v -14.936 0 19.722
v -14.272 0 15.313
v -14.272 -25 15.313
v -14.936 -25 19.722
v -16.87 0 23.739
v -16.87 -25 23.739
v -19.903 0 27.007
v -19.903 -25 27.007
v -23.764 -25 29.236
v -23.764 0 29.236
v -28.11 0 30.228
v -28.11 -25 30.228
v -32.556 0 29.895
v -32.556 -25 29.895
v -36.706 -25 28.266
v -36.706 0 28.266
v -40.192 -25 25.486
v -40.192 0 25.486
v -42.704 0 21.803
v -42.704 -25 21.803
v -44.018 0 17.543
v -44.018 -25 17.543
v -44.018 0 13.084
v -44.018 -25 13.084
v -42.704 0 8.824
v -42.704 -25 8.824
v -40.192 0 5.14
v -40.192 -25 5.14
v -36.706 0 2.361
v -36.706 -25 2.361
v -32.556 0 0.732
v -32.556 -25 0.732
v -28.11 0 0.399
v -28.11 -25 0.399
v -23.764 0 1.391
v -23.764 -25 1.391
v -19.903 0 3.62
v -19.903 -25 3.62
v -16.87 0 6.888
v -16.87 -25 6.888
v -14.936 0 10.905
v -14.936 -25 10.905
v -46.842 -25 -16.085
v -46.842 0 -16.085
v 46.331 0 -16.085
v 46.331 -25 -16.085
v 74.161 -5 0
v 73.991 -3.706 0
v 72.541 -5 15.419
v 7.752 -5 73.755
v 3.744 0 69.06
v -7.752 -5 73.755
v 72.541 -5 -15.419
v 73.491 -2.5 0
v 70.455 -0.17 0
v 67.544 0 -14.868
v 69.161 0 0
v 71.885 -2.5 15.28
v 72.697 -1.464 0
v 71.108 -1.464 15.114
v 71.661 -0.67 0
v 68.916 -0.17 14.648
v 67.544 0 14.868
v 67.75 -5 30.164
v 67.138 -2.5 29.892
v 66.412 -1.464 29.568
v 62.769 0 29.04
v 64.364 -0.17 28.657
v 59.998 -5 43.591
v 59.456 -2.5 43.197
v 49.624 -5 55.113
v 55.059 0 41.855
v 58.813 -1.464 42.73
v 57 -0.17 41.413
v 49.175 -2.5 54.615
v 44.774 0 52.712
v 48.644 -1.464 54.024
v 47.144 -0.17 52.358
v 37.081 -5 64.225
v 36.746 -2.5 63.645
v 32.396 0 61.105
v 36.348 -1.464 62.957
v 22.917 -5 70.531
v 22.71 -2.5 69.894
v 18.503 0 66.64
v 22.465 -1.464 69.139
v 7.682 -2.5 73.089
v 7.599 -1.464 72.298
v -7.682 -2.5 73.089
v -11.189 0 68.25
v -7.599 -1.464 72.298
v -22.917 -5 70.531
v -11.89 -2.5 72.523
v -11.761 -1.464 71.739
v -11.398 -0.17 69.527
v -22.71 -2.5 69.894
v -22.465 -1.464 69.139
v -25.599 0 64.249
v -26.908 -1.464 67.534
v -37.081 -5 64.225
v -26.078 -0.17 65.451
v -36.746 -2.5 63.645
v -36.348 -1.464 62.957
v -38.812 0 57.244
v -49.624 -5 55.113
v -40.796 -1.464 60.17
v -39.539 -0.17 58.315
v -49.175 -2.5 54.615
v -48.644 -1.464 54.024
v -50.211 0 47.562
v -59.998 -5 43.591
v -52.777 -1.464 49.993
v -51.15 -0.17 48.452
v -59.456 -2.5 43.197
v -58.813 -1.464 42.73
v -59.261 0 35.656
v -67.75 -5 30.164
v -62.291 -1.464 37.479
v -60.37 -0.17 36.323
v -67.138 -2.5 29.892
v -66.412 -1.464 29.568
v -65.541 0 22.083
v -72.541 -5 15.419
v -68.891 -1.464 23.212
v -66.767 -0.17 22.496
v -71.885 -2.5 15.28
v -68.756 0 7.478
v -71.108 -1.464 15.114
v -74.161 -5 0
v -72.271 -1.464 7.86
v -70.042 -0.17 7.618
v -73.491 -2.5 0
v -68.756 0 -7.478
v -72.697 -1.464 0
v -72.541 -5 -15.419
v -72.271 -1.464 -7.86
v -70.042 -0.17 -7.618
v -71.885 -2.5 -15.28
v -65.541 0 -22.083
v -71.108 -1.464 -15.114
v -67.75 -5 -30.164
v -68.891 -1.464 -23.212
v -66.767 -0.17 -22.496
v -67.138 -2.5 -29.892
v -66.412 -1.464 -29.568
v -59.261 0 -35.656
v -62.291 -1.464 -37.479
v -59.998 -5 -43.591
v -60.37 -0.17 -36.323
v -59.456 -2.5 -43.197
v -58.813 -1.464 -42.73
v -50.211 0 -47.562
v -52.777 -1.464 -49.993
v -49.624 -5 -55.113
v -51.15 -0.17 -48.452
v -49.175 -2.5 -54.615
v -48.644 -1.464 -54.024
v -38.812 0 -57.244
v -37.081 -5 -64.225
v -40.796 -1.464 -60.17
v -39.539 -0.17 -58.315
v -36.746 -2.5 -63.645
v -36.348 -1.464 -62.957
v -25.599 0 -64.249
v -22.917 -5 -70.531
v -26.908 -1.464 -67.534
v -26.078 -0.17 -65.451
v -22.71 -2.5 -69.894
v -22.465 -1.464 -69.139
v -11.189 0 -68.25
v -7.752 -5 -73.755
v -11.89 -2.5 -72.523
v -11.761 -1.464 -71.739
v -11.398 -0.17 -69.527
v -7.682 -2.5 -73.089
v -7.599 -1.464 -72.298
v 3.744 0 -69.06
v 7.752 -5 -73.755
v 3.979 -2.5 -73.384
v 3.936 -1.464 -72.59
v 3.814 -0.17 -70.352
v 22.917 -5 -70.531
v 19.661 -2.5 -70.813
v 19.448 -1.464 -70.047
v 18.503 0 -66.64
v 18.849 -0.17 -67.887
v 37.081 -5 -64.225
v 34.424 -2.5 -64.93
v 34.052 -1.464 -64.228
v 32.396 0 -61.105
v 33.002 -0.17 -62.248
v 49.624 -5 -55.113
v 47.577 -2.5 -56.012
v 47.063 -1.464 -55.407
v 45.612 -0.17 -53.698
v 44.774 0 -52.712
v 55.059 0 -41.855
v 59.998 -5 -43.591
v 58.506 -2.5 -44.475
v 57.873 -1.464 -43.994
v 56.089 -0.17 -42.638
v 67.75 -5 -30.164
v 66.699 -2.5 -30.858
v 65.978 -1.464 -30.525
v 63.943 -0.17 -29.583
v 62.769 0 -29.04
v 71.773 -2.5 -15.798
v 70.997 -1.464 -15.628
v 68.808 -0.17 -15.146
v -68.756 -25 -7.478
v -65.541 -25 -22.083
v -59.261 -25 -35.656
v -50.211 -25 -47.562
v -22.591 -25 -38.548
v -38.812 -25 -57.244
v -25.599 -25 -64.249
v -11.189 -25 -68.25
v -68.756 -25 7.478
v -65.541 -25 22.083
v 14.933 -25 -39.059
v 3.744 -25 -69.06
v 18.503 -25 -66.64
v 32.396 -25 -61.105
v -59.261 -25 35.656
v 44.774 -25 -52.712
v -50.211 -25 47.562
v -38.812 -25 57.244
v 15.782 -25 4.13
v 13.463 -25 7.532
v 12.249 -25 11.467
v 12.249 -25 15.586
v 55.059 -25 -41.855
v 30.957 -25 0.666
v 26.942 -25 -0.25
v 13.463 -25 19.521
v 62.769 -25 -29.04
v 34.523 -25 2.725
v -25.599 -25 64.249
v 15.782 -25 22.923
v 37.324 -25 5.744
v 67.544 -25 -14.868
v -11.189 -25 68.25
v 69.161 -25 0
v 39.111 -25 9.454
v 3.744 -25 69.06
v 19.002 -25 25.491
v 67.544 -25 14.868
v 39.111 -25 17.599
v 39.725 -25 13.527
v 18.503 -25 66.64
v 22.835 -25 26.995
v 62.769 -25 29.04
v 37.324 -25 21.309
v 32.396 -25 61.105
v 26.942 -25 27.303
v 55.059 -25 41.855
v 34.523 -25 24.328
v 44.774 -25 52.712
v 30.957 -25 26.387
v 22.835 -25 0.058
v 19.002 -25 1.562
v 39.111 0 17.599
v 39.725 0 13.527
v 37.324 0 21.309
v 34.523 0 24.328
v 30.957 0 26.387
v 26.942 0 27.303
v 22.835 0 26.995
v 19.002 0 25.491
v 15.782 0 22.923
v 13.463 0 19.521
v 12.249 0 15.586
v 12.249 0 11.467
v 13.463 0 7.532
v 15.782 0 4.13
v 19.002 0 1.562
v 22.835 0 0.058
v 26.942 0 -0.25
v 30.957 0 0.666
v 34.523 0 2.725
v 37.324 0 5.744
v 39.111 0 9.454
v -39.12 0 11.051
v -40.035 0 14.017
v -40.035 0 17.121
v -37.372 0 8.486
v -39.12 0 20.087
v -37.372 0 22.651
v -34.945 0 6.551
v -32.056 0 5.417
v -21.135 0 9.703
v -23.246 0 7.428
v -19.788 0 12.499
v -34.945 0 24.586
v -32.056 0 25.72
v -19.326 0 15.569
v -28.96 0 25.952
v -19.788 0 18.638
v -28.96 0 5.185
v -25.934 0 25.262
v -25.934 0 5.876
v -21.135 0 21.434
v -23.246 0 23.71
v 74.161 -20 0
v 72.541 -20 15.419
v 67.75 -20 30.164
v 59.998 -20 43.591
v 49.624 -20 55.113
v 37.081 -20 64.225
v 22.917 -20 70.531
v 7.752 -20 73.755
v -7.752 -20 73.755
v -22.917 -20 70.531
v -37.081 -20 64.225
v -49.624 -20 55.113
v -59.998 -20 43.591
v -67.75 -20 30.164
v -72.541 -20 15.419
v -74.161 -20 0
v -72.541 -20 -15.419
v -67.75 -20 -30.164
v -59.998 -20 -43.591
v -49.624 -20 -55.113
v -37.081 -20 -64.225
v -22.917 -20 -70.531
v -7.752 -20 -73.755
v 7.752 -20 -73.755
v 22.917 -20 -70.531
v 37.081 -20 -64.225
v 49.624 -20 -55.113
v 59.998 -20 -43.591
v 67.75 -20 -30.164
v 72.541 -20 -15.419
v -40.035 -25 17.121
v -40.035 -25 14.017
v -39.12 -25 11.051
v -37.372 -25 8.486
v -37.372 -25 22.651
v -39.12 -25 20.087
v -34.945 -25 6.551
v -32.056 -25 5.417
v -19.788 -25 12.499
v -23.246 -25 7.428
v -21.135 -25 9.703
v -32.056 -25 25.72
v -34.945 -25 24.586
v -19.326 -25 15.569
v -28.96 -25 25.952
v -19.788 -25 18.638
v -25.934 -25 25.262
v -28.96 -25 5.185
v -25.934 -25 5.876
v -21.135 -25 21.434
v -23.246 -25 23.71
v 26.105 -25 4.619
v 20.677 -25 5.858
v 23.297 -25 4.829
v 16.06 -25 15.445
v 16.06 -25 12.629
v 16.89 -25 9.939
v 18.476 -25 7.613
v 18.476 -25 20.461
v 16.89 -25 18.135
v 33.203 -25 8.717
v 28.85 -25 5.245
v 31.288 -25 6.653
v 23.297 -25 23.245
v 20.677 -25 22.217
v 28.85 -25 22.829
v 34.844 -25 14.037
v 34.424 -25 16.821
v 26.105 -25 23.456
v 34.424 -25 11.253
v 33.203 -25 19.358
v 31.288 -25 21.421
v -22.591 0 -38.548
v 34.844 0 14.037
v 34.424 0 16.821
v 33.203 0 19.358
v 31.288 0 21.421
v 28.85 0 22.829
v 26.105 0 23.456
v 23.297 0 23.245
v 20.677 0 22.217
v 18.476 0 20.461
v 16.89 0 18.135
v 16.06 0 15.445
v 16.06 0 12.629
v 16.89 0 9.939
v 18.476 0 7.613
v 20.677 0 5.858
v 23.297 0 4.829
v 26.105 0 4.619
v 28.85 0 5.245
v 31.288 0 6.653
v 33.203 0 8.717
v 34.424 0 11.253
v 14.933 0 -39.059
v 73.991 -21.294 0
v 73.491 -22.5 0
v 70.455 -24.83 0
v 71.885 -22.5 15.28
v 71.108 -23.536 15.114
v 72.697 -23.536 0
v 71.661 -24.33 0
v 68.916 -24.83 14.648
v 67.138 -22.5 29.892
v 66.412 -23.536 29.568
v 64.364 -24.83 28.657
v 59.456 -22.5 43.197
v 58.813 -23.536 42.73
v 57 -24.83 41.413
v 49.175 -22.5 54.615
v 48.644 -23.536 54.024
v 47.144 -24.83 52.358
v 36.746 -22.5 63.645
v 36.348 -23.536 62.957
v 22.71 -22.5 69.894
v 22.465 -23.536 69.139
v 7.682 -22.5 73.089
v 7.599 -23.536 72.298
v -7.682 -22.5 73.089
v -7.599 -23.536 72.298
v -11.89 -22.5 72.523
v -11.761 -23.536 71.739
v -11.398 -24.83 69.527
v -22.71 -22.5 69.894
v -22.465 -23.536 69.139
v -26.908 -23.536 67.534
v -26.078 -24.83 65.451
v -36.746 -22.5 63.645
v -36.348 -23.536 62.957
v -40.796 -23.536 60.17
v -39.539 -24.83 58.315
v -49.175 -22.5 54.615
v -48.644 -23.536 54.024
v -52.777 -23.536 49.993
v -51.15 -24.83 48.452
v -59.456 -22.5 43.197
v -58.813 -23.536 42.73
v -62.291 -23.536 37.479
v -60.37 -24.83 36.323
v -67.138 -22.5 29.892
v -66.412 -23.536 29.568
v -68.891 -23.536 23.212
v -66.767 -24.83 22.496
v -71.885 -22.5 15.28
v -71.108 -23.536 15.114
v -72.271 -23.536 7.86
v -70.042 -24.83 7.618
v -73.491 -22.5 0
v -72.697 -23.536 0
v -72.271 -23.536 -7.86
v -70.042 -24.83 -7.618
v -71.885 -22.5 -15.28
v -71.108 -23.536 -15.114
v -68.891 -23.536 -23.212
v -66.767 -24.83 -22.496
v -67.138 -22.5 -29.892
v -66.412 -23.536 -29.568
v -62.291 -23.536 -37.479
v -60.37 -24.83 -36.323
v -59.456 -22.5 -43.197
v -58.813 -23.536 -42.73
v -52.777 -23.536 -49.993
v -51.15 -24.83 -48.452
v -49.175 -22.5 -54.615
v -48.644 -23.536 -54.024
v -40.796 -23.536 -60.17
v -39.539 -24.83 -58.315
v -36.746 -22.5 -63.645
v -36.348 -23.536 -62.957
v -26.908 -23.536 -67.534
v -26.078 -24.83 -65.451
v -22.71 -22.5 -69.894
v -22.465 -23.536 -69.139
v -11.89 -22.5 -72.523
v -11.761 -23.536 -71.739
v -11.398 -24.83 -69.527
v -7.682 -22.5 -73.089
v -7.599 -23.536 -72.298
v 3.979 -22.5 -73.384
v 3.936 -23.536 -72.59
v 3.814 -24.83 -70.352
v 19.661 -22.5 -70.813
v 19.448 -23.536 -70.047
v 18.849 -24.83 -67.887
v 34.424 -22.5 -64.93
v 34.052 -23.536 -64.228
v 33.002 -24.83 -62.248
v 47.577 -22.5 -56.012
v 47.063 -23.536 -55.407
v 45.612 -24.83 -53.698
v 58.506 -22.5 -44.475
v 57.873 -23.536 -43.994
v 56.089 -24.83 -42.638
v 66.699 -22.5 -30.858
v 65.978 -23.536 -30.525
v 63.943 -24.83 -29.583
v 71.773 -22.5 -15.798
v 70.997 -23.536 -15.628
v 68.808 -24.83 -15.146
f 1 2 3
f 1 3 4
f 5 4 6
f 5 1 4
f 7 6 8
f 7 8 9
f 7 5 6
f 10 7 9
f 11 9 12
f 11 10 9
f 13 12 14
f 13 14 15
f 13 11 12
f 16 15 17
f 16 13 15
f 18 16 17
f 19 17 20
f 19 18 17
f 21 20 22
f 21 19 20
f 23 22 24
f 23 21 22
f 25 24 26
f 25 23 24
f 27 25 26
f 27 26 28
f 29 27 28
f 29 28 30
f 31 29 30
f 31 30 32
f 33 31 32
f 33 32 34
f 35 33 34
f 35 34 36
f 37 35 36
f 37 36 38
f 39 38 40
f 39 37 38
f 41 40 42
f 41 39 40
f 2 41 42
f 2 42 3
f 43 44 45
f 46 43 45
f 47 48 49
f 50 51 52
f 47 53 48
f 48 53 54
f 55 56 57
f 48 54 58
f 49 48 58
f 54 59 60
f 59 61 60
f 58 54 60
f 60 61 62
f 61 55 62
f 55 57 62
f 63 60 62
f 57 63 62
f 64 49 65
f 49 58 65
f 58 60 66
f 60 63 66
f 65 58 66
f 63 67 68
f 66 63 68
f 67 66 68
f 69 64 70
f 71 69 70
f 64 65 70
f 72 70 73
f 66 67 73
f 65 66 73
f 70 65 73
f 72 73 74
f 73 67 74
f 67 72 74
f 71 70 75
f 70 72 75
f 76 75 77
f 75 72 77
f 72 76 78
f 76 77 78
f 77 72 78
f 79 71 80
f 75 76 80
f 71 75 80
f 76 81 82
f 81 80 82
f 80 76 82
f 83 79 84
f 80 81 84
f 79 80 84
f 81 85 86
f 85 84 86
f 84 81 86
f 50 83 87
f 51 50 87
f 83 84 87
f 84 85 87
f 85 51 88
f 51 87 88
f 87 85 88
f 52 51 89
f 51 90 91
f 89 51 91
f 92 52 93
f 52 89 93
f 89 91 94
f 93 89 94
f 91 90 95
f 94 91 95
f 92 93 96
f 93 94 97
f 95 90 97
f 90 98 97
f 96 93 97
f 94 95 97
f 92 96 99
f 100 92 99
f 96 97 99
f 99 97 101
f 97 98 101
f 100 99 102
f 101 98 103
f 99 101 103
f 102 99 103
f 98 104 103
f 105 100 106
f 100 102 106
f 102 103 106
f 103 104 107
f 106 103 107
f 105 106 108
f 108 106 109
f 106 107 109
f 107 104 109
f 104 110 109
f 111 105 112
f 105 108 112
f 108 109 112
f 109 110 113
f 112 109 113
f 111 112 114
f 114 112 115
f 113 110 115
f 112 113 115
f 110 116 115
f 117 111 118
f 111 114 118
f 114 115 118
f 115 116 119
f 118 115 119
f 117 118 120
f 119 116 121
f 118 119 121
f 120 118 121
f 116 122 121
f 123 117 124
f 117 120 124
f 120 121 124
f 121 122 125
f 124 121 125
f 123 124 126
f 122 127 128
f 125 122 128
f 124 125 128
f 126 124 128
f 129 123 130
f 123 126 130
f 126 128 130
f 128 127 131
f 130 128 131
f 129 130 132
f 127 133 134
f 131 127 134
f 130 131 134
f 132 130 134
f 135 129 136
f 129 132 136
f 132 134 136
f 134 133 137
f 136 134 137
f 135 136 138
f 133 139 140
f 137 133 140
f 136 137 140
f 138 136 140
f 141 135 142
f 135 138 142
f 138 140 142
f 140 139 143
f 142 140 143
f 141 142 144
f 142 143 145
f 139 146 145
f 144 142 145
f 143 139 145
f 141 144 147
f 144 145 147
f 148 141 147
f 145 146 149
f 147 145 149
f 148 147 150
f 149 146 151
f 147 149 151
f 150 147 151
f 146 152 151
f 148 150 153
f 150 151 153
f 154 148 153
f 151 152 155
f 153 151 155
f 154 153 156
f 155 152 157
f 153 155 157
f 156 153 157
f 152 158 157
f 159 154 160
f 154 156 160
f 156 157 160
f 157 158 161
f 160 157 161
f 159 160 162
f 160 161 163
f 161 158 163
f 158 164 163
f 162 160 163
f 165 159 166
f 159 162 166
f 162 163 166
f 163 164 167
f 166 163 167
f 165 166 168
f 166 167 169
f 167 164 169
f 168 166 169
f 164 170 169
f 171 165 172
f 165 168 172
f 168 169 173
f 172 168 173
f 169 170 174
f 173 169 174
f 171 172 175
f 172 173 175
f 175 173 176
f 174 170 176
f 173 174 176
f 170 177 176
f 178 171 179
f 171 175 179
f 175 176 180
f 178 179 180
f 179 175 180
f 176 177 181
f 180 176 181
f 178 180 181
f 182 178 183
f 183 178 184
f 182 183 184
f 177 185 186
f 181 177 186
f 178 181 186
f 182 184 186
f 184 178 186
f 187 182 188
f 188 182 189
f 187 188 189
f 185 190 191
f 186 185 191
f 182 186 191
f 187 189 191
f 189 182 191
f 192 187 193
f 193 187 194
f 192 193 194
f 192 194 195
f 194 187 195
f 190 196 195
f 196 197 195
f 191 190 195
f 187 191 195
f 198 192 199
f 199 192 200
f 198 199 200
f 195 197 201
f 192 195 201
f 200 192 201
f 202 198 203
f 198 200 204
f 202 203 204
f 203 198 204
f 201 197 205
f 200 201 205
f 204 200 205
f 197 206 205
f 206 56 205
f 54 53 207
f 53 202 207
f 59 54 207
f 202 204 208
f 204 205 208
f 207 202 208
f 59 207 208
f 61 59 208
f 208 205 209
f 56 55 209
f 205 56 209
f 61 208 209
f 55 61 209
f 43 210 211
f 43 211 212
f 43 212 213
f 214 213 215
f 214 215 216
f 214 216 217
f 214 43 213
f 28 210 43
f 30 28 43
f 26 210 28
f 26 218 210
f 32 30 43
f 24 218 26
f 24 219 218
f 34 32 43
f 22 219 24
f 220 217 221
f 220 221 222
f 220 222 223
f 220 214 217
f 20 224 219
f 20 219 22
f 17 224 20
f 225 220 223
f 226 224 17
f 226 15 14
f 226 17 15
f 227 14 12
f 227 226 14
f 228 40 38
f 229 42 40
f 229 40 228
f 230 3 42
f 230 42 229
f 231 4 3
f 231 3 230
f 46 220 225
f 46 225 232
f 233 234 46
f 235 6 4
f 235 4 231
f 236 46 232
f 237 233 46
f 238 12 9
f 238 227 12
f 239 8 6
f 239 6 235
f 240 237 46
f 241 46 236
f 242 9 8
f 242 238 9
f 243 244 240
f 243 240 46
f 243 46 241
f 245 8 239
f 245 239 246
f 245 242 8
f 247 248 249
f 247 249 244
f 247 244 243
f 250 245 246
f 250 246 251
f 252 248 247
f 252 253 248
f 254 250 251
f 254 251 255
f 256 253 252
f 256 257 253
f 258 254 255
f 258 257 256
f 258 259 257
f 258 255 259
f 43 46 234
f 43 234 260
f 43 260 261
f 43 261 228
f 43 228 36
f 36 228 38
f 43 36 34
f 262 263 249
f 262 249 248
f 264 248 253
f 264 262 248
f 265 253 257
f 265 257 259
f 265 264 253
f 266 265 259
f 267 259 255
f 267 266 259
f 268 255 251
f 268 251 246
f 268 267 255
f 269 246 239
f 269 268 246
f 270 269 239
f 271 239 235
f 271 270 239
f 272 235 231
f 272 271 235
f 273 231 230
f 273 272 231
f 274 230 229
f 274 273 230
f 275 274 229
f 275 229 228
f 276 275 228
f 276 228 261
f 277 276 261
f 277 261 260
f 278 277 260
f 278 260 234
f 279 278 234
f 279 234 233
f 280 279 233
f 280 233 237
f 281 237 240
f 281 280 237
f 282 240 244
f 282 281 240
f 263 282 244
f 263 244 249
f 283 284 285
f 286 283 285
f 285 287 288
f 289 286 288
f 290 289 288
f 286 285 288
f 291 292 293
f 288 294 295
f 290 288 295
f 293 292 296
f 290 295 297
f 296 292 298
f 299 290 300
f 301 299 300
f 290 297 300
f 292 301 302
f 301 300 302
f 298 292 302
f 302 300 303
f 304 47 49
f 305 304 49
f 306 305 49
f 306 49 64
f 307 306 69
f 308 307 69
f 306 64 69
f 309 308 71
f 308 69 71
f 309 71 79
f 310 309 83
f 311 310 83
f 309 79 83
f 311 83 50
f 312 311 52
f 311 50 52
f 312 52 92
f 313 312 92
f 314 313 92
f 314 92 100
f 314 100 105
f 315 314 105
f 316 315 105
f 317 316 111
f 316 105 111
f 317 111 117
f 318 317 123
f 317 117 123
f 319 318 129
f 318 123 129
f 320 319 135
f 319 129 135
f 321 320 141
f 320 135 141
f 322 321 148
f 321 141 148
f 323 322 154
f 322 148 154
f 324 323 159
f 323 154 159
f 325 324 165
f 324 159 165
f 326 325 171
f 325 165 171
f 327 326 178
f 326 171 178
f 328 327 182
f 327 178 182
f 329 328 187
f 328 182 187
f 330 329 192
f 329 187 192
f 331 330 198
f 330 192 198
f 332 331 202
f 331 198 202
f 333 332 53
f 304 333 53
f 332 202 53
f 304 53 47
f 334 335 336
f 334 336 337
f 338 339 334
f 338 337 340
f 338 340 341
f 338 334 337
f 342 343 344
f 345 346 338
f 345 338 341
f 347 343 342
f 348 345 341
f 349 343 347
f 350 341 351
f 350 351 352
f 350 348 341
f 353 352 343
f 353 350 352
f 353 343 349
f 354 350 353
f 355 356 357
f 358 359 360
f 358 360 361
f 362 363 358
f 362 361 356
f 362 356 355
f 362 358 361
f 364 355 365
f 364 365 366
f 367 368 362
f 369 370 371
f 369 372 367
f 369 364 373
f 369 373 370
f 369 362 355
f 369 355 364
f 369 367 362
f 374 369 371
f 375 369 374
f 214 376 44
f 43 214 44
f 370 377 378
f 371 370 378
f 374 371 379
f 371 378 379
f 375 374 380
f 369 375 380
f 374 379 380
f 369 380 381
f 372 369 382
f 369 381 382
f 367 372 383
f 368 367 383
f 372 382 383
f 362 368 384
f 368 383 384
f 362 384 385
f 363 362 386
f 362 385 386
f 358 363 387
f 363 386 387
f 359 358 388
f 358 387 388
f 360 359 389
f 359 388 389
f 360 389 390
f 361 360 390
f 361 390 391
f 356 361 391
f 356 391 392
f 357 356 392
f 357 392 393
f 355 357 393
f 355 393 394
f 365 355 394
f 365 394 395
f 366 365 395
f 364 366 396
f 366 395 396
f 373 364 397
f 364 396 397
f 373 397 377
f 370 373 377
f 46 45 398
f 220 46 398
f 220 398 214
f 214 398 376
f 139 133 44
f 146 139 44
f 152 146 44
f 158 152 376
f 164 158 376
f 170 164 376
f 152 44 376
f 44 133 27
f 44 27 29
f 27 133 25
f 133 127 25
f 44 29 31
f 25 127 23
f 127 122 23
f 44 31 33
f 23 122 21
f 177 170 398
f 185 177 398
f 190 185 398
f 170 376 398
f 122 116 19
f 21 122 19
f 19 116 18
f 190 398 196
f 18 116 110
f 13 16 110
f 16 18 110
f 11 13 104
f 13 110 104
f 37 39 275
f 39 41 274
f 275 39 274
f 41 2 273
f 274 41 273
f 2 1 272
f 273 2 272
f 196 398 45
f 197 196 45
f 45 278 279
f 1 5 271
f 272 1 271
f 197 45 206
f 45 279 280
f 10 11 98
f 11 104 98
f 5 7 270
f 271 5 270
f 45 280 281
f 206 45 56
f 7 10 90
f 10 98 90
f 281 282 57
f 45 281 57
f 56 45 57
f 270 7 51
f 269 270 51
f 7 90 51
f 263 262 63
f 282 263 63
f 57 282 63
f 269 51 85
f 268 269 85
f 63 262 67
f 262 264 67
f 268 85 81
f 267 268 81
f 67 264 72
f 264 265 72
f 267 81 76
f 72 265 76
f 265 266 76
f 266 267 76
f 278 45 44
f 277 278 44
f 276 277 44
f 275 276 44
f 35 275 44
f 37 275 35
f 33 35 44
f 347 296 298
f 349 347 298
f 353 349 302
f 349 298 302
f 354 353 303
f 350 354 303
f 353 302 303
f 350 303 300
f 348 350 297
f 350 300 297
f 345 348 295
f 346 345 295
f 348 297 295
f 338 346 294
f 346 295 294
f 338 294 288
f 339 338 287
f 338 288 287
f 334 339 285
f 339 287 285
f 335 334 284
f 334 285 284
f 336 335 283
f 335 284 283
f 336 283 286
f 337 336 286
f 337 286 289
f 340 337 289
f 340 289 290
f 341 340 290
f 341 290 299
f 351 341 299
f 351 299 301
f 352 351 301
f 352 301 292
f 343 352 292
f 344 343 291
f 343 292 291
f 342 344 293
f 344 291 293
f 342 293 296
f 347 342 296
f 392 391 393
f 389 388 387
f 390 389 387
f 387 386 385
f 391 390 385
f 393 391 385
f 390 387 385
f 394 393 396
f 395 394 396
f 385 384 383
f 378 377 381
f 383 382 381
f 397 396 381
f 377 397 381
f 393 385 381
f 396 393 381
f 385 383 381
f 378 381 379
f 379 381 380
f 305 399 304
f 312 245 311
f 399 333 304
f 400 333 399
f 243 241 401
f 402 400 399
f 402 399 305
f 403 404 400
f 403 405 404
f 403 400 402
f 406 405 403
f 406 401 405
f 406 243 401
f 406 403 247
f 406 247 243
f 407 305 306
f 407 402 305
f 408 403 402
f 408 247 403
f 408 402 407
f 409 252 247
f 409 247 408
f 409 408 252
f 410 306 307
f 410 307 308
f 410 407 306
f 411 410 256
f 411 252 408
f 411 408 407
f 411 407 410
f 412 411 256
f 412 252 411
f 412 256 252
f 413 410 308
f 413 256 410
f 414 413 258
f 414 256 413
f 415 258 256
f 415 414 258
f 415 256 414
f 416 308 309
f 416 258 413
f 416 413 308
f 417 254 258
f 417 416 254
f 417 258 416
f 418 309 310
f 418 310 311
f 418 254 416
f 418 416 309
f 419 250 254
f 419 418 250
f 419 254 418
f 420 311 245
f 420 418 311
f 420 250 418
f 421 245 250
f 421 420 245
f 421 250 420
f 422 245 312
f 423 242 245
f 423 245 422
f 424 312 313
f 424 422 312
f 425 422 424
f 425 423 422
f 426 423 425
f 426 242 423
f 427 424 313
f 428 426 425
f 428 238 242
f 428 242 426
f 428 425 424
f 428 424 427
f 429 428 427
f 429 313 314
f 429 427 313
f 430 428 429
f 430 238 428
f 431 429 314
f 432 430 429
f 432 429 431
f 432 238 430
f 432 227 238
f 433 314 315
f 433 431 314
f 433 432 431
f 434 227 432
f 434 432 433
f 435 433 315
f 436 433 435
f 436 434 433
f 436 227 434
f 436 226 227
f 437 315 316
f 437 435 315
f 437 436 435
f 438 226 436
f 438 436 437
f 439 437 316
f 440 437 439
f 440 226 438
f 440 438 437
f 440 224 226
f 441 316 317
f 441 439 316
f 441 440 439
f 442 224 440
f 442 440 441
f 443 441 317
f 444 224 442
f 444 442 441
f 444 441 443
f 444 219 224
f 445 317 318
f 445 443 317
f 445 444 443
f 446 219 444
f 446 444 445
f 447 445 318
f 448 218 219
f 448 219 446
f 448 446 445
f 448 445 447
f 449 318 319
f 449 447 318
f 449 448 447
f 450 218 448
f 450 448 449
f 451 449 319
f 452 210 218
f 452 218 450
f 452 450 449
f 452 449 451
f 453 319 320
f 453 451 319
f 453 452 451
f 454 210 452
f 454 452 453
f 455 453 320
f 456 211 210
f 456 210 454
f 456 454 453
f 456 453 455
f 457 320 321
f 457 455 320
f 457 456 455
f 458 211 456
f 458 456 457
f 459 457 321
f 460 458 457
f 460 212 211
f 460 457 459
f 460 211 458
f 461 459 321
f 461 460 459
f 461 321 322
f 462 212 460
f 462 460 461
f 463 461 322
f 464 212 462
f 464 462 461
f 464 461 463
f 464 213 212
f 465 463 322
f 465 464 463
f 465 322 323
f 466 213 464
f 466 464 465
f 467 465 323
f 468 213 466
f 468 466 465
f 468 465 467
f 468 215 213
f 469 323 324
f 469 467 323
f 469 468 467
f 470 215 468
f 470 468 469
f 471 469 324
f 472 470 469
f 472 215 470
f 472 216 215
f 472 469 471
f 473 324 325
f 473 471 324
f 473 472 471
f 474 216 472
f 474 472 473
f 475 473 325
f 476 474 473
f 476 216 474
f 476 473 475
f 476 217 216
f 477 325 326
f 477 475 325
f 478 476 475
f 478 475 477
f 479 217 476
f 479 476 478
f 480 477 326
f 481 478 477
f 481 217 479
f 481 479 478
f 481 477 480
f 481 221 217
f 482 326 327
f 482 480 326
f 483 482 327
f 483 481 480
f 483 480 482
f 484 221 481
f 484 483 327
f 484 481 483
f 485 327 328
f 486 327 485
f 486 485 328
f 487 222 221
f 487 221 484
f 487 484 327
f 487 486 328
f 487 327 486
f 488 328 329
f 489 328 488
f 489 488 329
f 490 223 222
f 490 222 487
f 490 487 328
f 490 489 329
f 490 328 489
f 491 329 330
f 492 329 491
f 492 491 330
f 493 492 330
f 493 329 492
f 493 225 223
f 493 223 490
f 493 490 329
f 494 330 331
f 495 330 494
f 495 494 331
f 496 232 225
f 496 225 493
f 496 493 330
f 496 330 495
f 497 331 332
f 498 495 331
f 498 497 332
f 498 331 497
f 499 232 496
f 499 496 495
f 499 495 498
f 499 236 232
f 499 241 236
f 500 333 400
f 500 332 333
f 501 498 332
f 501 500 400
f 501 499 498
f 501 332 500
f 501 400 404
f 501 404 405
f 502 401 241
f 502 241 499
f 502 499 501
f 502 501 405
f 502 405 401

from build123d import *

# Parameters (mm, degrees)
F0_R     = 74.161185
F0_R_2   = 14.956578
F0_R_3   = 13.815137
F1_DEPTH = 25
F2_R     = 9.444896
F2_R_2   = 10.41291
F3_DEPTH = 25
F4_R     = 5


with BuildPart() as f1:
    # F0 (on Front) → F1 (new body)
    with BuildSketch(Plane.XZ):
        Circle(F0_R)
        Polygon((-22.591168, -38.548041), (-46.841573, -16.084507), (46.331033, -16.084507), (14.933145, -39.058577), align=None, mode=Mode.SUBTRACT)
        with Locations((-29.228121, 15.313388)):
            Circle(F0_R_2, mode=Mode.SUBTRACT)
        with Locations((25.909645, 13.526515)):
            Circle(F0_R_3, mode=Mode.SUBTRACT)
    extrude(amount=F1_DEPTH)

    # F4
    f4_edges = [f1.edges().sort_by_distance(p)[0] for p in [
        (74.161185, -12.5, 0),
        (-74.161185, 0, 0),
        (-74.161185, -25, 0),
    ]]
    fillet(f4_edges, radius=F4_R)


with BuildPart() as f3:
    # F2 (on Front) → F3 (new body)
    with BuildSketch(Plane.XZ):
        with Locations((25.399109, 14.03705)):
            Circle(F2_R)
        with Locations((-29.738655, 15.568655)):
            Circle(F2_R_2)
    extrude(amount=F3_DEPTH)


solid = Compound([f1.part, f3.part])
